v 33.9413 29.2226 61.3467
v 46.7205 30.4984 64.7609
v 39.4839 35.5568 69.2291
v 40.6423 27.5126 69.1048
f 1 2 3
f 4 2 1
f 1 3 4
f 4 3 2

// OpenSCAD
// Auto-generated auxetic polyhedron
points = [
    [39.483927, 35.556846, 69.229080],
    [46.720492, 30.498426, 64.760858],
    [33.941310, 29.222601, 61.346675],
    [40.642271, 27.512624, 69.104845],
];

faces = [
    [0, 1, 2],
    [2, 1, 3],
    [3, 0, 2],
    [1, 0, 3],
];

polyhedron(points = points, faces = faces);
